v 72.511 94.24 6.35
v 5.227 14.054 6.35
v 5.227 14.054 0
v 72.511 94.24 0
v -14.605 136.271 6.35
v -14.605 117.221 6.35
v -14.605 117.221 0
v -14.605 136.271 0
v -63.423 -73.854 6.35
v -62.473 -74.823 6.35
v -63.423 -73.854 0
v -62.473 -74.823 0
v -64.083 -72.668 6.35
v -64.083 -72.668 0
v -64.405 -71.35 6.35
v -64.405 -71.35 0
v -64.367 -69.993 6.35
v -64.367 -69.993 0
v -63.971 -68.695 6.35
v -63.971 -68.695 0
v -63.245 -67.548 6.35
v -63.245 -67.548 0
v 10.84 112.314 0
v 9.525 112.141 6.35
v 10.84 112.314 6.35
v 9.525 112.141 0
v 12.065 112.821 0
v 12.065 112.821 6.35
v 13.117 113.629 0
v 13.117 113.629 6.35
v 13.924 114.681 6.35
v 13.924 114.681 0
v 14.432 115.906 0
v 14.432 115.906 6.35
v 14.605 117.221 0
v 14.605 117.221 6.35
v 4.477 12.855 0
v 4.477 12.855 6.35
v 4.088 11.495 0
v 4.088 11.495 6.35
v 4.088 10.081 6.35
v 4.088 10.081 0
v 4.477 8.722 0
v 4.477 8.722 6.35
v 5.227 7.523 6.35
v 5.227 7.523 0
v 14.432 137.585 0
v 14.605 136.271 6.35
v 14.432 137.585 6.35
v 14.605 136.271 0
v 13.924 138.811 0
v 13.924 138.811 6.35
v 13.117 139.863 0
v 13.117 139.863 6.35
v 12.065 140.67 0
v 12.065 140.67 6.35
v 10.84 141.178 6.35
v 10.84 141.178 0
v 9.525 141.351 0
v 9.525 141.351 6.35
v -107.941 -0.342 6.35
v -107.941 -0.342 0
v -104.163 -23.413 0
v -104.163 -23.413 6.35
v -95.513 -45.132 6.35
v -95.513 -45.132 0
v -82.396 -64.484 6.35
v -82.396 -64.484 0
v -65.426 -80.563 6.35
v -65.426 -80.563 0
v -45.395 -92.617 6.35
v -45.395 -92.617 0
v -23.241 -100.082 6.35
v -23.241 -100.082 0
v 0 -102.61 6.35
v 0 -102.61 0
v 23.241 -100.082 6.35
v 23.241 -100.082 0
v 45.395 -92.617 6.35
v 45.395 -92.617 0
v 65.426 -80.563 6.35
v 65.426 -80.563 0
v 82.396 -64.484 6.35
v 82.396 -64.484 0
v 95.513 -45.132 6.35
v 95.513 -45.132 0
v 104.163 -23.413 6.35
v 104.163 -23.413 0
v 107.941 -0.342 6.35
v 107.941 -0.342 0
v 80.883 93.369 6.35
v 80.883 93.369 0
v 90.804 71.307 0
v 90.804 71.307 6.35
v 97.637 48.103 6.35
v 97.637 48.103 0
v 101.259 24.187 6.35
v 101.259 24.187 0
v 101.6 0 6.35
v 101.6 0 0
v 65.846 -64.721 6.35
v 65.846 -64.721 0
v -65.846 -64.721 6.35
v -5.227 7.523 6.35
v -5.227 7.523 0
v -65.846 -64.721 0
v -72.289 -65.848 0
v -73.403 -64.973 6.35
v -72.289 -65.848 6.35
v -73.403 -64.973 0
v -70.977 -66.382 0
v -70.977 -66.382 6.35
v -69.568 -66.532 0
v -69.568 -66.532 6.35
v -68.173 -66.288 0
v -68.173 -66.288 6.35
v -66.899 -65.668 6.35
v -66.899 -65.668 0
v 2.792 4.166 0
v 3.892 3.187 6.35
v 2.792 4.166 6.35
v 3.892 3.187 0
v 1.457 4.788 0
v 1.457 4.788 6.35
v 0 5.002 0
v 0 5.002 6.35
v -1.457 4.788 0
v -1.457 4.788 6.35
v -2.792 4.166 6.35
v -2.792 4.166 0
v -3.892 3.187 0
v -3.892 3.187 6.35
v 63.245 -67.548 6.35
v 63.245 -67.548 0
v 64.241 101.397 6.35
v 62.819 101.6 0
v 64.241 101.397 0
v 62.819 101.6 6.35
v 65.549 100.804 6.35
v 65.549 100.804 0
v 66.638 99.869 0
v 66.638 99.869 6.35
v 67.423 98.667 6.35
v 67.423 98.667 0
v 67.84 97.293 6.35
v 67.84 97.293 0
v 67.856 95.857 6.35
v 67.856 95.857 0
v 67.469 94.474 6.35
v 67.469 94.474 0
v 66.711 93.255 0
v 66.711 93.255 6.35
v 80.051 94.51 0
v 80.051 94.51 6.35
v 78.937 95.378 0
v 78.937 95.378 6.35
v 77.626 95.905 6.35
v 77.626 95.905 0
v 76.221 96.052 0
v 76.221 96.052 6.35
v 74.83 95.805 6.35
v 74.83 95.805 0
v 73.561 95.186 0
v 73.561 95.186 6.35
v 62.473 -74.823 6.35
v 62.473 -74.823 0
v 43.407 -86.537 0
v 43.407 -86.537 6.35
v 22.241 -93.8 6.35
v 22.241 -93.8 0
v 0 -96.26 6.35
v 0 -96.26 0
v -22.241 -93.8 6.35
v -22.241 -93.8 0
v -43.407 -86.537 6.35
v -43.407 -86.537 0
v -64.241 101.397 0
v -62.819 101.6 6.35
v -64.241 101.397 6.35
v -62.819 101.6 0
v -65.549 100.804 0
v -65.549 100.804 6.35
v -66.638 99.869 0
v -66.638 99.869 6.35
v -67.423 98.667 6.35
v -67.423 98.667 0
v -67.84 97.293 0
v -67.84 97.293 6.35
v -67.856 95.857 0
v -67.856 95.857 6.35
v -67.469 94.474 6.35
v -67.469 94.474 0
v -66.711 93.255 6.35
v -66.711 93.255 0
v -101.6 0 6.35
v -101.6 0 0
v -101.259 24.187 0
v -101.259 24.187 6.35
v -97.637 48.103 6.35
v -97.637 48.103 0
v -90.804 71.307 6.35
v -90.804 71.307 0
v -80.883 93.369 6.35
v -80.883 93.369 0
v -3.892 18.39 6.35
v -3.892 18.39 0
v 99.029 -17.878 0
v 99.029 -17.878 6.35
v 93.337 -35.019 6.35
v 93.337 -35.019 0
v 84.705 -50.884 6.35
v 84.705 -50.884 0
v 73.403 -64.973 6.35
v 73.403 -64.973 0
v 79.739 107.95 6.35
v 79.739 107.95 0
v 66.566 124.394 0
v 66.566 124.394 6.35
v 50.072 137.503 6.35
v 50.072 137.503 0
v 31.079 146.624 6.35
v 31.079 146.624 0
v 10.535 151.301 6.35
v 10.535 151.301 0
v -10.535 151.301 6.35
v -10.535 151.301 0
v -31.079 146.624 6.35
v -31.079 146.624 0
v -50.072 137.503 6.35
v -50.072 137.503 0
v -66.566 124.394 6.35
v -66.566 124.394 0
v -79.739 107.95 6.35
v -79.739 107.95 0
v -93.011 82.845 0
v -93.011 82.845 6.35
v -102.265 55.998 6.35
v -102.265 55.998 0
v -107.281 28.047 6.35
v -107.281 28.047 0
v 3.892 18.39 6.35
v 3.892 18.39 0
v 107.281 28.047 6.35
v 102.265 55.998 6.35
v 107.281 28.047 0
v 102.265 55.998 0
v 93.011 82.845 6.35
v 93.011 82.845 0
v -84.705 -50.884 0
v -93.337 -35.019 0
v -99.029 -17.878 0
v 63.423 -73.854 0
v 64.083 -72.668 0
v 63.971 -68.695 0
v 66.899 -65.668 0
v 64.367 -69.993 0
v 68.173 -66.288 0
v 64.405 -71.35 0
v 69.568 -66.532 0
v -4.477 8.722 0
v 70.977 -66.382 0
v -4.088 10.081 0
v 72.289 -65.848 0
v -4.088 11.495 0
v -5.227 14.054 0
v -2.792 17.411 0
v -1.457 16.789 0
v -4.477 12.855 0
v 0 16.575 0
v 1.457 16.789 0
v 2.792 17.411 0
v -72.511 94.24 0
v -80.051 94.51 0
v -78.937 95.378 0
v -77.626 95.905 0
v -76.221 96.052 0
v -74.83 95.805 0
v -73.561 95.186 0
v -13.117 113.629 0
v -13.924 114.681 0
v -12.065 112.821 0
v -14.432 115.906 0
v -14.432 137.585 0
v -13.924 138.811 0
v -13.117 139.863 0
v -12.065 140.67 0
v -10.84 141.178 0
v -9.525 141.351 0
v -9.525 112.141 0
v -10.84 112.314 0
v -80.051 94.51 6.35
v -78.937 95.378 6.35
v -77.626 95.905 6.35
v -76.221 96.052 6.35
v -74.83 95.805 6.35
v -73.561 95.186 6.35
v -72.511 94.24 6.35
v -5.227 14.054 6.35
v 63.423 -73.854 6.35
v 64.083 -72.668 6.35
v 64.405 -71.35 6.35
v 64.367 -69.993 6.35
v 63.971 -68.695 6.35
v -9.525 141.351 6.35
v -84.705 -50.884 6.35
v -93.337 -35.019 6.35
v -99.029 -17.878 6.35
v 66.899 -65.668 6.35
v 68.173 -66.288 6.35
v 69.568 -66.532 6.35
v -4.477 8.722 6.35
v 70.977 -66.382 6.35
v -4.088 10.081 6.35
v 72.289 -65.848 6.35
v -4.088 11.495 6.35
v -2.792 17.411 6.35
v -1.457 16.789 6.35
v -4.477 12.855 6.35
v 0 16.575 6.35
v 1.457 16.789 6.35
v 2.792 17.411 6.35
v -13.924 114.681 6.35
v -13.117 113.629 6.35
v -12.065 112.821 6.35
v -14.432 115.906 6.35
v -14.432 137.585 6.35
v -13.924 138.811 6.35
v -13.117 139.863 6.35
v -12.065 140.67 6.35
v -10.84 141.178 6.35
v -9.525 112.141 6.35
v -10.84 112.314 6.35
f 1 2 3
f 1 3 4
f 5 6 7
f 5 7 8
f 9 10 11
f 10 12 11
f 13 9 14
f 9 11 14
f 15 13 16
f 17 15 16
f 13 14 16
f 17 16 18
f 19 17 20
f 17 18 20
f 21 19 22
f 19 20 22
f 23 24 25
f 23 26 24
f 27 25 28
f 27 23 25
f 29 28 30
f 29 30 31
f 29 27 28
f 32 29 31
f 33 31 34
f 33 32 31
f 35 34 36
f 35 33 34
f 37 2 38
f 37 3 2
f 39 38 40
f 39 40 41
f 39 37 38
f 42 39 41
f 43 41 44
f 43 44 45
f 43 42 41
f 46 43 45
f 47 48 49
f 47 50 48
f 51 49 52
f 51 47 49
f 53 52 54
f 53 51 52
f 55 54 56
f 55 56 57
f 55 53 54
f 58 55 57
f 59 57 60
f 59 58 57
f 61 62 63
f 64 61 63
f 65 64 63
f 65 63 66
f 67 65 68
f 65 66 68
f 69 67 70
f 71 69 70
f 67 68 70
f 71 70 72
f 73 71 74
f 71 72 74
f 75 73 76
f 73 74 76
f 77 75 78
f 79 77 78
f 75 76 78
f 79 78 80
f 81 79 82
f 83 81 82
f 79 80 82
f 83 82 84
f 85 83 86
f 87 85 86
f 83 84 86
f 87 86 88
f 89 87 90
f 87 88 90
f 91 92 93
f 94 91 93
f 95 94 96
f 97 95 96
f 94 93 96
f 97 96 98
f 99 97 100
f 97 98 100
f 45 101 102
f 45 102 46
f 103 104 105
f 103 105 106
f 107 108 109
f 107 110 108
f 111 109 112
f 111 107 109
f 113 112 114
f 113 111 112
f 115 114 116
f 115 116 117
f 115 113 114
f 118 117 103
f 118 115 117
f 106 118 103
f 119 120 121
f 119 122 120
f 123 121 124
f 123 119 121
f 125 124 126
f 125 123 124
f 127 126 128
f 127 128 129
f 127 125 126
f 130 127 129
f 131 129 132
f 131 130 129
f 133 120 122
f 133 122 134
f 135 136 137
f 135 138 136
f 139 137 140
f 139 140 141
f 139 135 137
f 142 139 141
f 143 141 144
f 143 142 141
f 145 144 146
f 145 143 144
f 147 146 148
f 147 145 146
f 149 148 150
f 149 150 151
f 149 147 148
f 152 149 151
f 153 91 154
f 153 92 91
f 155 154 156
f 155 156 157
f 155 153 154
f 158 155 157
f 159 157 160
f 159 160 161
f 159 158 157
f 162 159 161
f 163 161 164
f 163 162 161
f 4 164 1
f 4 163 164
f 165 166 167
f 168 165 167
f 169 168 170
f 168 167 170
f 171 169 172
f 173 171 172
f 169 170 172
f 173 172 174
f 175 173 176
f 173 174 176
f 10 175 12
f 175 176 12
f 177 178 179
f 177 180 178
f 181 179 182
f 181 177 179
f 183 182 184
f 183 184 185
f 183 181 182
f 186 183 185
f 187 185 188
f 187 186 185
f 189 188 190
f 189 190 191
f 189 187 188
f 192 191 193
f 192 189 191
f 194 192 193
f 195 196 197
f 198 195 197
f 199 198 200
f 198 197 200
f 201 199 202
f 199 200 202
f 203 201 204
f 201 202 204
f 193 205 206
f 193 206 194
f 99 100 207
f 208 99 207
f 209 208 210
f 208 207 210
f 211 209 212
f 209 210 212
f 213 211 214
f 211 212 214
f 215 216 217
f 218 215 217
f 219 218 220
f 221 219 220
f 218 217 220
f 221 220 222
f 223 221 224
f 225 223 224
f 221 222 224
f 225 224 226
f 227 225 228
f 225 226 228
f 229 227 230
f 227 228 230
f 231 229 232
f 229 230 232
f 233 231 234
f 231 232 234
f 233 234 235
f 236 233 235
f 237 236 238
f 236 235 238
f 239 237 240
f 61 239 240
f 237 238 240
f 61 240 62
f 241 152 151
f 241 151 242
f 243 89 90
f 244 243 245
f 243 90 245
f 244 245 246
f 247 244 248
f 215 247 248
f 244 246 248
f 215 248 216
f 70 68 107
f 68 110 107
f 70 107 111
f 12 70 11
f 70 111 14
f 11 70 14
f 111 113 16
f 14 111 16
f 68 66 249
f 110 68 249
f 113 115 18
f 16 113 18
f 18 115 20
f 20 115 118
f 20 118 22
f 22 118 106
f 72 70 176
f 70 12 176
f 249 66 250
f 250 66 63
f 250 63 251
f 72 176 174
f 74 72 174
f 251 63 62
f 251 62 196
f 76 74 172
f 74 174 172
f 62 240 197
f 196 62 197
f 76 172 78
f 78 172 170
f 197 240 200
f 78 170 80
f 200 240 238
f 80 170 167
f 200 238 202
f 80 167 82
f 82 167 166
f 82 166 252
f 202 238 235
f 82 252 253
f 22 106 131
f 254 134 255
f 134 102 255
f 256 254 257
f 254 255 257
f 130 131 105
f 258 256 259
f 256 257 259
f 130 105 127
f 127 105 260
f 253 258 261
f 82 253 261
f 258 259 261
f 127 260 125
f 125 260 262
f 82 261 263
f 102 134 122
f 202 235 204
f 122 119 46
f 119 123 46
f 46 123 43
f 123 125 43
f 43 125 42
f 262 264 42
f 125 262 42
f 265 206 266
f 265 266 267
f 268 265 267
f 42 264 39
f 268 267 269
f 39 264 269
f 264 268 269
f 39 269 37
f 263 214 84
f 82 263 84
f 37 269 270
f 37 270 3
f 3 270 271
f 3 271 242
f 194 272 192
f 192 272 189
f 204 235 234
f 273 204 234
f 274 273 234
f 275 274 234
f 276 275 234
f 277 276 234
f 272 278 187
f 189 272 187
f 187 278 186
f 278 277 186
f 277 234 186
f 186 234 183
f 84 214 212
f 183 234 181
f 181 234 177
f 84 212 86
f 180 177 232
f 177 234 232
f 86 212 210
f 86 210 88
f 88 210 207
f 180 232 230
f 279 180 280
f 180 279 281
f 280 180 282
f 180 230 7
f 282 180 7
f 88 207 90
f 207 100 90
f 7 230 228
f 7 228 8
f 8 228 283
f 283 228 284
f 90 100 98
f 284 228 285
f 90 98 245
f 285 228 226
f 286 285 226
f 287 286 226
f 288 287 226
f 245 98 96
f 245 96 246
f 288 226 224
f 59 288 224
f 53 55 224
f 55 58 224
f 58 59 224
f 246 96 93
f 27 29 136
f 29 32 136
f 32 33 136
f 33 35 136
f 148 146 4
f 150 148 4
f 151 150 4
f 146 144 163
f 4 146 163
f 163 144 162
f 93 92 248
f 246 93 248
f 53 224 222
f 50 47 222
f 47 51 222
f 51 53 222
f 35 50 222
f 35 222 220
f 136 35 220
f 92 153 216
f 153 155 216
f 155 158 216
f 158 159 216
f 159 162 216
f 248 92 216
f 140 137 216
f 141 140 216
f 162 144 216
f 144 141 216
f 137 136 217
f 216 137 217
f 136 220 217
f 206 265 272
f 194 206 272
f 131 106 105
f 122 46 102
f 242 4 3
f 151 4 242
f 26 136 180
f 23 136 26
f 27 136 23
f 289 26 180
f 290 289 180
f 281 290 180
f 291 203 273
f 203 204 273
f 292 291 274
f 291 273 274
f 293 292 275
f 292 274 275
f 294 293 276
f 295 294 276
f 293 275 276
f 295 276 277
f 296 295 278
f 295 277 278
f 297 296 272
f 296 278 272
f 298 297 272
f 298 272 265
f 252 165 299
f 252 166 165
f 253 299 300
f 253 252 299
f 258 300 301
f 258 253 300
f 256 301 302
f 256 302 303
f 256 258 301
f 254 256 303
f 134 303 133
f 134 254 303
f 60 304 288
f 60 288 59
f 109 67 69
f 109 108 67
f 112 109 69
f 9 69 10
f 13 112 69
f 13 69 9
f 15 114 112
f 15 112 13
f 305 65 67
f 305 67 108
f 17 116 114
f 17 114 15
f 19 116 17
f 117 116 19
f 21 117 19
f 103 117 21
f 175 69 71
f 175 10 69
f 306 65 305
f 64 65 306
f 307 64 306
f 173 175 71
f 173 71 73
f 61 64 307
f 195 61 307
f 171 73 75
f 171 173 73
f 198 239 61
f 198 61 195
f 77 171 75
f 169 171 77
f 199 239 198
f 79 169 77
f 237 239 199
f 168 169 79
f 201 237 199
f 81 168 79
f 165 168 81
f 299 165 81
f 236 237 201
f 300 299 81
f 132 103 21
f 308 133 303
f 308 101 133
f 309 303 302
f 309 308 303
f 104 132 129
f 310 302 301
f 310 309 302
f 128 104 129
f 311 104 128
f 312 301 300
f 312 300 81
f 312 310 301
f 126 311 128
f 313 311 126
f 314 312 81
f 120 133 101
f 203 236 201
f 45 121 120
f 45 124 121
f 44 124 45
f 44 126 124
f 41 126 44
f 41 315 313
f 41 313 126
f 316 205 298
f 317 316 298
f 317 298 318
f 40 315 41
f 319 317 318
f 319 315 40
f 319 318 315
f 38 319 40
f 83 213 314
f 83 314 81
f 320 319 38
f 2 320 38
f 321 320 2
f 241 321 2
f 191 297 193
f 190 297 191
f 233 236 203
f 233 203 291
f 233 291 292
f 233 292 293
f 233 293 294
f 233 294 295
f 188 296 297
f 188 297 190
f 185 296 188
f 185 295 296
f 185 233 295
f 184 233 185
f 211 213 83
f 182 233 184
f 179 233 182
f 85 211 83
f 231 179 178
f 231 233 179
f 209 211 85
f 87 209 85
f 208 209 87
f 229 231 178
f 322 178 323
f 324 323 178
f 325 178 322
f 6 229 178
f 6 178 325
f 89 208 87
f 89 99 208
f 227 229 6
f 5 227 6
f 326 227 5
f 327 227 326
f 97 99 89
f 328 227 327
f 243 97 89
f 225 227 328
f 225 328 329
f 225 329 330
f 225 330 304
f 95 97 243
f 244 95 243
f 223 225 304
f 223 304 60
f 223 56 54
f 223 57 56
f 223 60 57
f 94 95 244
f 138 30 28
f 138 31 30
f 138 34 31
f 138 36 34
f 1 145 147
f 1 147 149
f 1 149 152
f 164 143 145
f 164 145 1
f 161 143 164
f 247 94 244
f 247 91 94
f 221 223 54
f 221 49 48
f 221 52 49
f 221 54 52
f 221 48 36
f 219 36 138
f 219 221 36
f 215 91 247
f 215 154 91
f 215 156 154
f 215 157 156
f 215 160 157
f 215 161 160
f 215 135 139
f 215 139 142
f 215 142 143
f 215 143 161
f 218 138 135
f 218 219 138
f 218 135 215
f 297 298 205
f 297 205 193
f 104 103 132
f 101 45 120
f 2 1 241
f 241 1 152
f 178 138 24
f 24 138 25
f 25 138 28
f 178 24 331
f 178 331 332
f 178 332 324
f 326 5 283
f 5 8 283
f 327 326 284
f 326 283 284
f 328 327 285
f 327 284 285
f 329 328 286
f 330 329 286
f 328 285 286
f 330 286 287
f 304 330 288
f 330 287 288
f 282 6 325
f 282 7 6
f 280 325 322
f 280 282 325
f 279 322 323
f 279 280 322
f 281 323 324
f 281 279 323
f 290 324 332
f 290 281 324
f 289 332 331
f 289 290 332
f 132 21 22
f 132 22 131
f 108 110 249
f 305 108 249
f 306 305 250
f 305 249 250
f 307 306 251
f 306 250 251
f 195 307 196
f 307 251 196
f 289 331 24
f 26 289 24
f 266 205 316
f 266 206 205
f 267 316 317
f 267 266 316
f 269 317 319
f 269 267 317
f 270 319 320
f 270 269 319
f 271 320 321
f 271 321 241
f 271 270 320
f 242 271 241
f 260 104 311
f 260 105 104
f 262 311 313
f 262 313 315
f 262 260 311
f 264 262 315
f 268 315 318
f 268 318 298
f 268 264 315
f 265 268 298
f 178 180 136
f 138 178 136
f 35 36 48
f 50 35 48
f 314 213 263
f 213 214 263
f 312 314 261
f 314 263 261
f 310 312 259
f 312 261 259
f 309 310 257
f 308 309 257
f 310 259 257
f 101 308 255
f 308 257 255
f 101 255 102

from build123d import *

# Parameters (mm, degrees)
BOSS_EXTRUDE1_DEPTH = 6.35
CUT_EXTRUDE1_REACH  = 8.35
SKETCH2_W           = 29.21
SKETCH2_H           = 29.21
FILLET1_R           = 5.08
BOSS_EXTRUDE2_DEPTH = 6.35
FILLET2_R           = 5.08


with BuildPart() as part:
    # Sketch1 → Boss-Extrude1 (new body)
    with BuildSketch(Plane.XY):
        with BuildLine():
            ThreePointArc((-79.739479369, 107.95), (-102.265174294, 55.997788823), (-107.940757138, -0.342489287))
            ThreePointArc((-107.940757138, -0.342489287), (0, -102.610284874), (107.940757138, -0.342489287))
            ThreePointArc((107.940757138, -0.342489287), (102.265174294, 55.997788823), (79.739479369, 107.95))
            ThreePointArc((79.739479369, 107.95), (0, 151.891393684), (-79.739479369, 107.95))
        make_face()
        with BuildLine():
            Line((-76.2, 101.6), (76.2, 101.6))
            ThreePointArc((76.2, 101.6), (96.55013665, 52.712534163), (101.6, 0))
            ThreePointArc((101.6, 0), (0, -96.260283012), (-101.6, 0))
            ThreePointArc((-101.6, 0), (-96.55013665, 52.712534163), (-76.2, 101.6))
        make_face(mode=Mode.SUBTRACT)
    extrude(amount=BOSS_EXTRUDE1_DEPTH)

    # Sketch2 → Cut-Extrude1 (cut, up to next)
    with BuildSketch(Plane.XY.offset(6.35), mode=Mode.PRIVATE) as cut_extrude1_sk1:
        with Locations((0, 126.745696842)):
            Rectangle(SKETCH2_W, SKETCH2_H)
    cut_extrude1_tool1 = extrude(cut_extrude1_sk1.sketch, amount=-CUT_EXTRUDE1_REACH, mode=Mode.PRIVATE) & part.part
    add(cut_extrude1_tool1.solids().sort_by_distance((0, 126.745697, 6.35))[0], mode=Mode.SUBTRACT)

    # Fillet1
    fillet1_edges = [part.edges().sort_by_distance(p)[0] for p in [
        (14.605, 141.350696842, 3.175),
        (14.605, 112.140696842, 3.175),
        (-14.605, 112.140696842, 3.175),
        (-14.605, 141.350696842, 3.175),
    ]]
    fillet(fillet1_edges, radius=FILLET1_R)

    # Sketch3 → Boss-Extrude2 (add)
    with BuildSketch(Plane.XY.offset(6.35)):
        Polygon((-77.659314664, 100.375489604), (69.28193291, -74.742270093), (72.200562238, -72.293249301), (-74.740685336, 102.824510396), align=None)
        Polygon((74.740685336, 102.824510396), (-72.200562238, -72.293249301), (-69.28193291, -74.742270093), (77.659314664, 100.375489604), align=None)
    extrude(amount=-BOSS_EXTRUDE2_DEPTH)

    # Fillet2
    fillet2_edges = [part.edges().sort_by_distance(p)[0] for p in [
        (73.713199114, 101.6, 3.175),
        (0, 13.752030134, 3.175),
        (-73.713199114, 101.6, 3.175),
        (-77.233836777, 99.868424803, 3.175),
        (-2.486800886, 10.788376244, 3.175),
        (-69.382552816, -68.934876448, 3.175),
        (-66.545991735, -71.481702369, 3.175),
        (0, 7.824722354, 3.175),
        (66.545991735, -71.481702369, 3.175),
        (69.382552816, -68.934876448, 3.175),
        (2.486800886, 10.788376244, 3.175),
        (77.233836777, 99.868424803, 3.175),
    ]]
    fillet(fillet2_edges, radius=FILLET2_R)


solid = part.part
